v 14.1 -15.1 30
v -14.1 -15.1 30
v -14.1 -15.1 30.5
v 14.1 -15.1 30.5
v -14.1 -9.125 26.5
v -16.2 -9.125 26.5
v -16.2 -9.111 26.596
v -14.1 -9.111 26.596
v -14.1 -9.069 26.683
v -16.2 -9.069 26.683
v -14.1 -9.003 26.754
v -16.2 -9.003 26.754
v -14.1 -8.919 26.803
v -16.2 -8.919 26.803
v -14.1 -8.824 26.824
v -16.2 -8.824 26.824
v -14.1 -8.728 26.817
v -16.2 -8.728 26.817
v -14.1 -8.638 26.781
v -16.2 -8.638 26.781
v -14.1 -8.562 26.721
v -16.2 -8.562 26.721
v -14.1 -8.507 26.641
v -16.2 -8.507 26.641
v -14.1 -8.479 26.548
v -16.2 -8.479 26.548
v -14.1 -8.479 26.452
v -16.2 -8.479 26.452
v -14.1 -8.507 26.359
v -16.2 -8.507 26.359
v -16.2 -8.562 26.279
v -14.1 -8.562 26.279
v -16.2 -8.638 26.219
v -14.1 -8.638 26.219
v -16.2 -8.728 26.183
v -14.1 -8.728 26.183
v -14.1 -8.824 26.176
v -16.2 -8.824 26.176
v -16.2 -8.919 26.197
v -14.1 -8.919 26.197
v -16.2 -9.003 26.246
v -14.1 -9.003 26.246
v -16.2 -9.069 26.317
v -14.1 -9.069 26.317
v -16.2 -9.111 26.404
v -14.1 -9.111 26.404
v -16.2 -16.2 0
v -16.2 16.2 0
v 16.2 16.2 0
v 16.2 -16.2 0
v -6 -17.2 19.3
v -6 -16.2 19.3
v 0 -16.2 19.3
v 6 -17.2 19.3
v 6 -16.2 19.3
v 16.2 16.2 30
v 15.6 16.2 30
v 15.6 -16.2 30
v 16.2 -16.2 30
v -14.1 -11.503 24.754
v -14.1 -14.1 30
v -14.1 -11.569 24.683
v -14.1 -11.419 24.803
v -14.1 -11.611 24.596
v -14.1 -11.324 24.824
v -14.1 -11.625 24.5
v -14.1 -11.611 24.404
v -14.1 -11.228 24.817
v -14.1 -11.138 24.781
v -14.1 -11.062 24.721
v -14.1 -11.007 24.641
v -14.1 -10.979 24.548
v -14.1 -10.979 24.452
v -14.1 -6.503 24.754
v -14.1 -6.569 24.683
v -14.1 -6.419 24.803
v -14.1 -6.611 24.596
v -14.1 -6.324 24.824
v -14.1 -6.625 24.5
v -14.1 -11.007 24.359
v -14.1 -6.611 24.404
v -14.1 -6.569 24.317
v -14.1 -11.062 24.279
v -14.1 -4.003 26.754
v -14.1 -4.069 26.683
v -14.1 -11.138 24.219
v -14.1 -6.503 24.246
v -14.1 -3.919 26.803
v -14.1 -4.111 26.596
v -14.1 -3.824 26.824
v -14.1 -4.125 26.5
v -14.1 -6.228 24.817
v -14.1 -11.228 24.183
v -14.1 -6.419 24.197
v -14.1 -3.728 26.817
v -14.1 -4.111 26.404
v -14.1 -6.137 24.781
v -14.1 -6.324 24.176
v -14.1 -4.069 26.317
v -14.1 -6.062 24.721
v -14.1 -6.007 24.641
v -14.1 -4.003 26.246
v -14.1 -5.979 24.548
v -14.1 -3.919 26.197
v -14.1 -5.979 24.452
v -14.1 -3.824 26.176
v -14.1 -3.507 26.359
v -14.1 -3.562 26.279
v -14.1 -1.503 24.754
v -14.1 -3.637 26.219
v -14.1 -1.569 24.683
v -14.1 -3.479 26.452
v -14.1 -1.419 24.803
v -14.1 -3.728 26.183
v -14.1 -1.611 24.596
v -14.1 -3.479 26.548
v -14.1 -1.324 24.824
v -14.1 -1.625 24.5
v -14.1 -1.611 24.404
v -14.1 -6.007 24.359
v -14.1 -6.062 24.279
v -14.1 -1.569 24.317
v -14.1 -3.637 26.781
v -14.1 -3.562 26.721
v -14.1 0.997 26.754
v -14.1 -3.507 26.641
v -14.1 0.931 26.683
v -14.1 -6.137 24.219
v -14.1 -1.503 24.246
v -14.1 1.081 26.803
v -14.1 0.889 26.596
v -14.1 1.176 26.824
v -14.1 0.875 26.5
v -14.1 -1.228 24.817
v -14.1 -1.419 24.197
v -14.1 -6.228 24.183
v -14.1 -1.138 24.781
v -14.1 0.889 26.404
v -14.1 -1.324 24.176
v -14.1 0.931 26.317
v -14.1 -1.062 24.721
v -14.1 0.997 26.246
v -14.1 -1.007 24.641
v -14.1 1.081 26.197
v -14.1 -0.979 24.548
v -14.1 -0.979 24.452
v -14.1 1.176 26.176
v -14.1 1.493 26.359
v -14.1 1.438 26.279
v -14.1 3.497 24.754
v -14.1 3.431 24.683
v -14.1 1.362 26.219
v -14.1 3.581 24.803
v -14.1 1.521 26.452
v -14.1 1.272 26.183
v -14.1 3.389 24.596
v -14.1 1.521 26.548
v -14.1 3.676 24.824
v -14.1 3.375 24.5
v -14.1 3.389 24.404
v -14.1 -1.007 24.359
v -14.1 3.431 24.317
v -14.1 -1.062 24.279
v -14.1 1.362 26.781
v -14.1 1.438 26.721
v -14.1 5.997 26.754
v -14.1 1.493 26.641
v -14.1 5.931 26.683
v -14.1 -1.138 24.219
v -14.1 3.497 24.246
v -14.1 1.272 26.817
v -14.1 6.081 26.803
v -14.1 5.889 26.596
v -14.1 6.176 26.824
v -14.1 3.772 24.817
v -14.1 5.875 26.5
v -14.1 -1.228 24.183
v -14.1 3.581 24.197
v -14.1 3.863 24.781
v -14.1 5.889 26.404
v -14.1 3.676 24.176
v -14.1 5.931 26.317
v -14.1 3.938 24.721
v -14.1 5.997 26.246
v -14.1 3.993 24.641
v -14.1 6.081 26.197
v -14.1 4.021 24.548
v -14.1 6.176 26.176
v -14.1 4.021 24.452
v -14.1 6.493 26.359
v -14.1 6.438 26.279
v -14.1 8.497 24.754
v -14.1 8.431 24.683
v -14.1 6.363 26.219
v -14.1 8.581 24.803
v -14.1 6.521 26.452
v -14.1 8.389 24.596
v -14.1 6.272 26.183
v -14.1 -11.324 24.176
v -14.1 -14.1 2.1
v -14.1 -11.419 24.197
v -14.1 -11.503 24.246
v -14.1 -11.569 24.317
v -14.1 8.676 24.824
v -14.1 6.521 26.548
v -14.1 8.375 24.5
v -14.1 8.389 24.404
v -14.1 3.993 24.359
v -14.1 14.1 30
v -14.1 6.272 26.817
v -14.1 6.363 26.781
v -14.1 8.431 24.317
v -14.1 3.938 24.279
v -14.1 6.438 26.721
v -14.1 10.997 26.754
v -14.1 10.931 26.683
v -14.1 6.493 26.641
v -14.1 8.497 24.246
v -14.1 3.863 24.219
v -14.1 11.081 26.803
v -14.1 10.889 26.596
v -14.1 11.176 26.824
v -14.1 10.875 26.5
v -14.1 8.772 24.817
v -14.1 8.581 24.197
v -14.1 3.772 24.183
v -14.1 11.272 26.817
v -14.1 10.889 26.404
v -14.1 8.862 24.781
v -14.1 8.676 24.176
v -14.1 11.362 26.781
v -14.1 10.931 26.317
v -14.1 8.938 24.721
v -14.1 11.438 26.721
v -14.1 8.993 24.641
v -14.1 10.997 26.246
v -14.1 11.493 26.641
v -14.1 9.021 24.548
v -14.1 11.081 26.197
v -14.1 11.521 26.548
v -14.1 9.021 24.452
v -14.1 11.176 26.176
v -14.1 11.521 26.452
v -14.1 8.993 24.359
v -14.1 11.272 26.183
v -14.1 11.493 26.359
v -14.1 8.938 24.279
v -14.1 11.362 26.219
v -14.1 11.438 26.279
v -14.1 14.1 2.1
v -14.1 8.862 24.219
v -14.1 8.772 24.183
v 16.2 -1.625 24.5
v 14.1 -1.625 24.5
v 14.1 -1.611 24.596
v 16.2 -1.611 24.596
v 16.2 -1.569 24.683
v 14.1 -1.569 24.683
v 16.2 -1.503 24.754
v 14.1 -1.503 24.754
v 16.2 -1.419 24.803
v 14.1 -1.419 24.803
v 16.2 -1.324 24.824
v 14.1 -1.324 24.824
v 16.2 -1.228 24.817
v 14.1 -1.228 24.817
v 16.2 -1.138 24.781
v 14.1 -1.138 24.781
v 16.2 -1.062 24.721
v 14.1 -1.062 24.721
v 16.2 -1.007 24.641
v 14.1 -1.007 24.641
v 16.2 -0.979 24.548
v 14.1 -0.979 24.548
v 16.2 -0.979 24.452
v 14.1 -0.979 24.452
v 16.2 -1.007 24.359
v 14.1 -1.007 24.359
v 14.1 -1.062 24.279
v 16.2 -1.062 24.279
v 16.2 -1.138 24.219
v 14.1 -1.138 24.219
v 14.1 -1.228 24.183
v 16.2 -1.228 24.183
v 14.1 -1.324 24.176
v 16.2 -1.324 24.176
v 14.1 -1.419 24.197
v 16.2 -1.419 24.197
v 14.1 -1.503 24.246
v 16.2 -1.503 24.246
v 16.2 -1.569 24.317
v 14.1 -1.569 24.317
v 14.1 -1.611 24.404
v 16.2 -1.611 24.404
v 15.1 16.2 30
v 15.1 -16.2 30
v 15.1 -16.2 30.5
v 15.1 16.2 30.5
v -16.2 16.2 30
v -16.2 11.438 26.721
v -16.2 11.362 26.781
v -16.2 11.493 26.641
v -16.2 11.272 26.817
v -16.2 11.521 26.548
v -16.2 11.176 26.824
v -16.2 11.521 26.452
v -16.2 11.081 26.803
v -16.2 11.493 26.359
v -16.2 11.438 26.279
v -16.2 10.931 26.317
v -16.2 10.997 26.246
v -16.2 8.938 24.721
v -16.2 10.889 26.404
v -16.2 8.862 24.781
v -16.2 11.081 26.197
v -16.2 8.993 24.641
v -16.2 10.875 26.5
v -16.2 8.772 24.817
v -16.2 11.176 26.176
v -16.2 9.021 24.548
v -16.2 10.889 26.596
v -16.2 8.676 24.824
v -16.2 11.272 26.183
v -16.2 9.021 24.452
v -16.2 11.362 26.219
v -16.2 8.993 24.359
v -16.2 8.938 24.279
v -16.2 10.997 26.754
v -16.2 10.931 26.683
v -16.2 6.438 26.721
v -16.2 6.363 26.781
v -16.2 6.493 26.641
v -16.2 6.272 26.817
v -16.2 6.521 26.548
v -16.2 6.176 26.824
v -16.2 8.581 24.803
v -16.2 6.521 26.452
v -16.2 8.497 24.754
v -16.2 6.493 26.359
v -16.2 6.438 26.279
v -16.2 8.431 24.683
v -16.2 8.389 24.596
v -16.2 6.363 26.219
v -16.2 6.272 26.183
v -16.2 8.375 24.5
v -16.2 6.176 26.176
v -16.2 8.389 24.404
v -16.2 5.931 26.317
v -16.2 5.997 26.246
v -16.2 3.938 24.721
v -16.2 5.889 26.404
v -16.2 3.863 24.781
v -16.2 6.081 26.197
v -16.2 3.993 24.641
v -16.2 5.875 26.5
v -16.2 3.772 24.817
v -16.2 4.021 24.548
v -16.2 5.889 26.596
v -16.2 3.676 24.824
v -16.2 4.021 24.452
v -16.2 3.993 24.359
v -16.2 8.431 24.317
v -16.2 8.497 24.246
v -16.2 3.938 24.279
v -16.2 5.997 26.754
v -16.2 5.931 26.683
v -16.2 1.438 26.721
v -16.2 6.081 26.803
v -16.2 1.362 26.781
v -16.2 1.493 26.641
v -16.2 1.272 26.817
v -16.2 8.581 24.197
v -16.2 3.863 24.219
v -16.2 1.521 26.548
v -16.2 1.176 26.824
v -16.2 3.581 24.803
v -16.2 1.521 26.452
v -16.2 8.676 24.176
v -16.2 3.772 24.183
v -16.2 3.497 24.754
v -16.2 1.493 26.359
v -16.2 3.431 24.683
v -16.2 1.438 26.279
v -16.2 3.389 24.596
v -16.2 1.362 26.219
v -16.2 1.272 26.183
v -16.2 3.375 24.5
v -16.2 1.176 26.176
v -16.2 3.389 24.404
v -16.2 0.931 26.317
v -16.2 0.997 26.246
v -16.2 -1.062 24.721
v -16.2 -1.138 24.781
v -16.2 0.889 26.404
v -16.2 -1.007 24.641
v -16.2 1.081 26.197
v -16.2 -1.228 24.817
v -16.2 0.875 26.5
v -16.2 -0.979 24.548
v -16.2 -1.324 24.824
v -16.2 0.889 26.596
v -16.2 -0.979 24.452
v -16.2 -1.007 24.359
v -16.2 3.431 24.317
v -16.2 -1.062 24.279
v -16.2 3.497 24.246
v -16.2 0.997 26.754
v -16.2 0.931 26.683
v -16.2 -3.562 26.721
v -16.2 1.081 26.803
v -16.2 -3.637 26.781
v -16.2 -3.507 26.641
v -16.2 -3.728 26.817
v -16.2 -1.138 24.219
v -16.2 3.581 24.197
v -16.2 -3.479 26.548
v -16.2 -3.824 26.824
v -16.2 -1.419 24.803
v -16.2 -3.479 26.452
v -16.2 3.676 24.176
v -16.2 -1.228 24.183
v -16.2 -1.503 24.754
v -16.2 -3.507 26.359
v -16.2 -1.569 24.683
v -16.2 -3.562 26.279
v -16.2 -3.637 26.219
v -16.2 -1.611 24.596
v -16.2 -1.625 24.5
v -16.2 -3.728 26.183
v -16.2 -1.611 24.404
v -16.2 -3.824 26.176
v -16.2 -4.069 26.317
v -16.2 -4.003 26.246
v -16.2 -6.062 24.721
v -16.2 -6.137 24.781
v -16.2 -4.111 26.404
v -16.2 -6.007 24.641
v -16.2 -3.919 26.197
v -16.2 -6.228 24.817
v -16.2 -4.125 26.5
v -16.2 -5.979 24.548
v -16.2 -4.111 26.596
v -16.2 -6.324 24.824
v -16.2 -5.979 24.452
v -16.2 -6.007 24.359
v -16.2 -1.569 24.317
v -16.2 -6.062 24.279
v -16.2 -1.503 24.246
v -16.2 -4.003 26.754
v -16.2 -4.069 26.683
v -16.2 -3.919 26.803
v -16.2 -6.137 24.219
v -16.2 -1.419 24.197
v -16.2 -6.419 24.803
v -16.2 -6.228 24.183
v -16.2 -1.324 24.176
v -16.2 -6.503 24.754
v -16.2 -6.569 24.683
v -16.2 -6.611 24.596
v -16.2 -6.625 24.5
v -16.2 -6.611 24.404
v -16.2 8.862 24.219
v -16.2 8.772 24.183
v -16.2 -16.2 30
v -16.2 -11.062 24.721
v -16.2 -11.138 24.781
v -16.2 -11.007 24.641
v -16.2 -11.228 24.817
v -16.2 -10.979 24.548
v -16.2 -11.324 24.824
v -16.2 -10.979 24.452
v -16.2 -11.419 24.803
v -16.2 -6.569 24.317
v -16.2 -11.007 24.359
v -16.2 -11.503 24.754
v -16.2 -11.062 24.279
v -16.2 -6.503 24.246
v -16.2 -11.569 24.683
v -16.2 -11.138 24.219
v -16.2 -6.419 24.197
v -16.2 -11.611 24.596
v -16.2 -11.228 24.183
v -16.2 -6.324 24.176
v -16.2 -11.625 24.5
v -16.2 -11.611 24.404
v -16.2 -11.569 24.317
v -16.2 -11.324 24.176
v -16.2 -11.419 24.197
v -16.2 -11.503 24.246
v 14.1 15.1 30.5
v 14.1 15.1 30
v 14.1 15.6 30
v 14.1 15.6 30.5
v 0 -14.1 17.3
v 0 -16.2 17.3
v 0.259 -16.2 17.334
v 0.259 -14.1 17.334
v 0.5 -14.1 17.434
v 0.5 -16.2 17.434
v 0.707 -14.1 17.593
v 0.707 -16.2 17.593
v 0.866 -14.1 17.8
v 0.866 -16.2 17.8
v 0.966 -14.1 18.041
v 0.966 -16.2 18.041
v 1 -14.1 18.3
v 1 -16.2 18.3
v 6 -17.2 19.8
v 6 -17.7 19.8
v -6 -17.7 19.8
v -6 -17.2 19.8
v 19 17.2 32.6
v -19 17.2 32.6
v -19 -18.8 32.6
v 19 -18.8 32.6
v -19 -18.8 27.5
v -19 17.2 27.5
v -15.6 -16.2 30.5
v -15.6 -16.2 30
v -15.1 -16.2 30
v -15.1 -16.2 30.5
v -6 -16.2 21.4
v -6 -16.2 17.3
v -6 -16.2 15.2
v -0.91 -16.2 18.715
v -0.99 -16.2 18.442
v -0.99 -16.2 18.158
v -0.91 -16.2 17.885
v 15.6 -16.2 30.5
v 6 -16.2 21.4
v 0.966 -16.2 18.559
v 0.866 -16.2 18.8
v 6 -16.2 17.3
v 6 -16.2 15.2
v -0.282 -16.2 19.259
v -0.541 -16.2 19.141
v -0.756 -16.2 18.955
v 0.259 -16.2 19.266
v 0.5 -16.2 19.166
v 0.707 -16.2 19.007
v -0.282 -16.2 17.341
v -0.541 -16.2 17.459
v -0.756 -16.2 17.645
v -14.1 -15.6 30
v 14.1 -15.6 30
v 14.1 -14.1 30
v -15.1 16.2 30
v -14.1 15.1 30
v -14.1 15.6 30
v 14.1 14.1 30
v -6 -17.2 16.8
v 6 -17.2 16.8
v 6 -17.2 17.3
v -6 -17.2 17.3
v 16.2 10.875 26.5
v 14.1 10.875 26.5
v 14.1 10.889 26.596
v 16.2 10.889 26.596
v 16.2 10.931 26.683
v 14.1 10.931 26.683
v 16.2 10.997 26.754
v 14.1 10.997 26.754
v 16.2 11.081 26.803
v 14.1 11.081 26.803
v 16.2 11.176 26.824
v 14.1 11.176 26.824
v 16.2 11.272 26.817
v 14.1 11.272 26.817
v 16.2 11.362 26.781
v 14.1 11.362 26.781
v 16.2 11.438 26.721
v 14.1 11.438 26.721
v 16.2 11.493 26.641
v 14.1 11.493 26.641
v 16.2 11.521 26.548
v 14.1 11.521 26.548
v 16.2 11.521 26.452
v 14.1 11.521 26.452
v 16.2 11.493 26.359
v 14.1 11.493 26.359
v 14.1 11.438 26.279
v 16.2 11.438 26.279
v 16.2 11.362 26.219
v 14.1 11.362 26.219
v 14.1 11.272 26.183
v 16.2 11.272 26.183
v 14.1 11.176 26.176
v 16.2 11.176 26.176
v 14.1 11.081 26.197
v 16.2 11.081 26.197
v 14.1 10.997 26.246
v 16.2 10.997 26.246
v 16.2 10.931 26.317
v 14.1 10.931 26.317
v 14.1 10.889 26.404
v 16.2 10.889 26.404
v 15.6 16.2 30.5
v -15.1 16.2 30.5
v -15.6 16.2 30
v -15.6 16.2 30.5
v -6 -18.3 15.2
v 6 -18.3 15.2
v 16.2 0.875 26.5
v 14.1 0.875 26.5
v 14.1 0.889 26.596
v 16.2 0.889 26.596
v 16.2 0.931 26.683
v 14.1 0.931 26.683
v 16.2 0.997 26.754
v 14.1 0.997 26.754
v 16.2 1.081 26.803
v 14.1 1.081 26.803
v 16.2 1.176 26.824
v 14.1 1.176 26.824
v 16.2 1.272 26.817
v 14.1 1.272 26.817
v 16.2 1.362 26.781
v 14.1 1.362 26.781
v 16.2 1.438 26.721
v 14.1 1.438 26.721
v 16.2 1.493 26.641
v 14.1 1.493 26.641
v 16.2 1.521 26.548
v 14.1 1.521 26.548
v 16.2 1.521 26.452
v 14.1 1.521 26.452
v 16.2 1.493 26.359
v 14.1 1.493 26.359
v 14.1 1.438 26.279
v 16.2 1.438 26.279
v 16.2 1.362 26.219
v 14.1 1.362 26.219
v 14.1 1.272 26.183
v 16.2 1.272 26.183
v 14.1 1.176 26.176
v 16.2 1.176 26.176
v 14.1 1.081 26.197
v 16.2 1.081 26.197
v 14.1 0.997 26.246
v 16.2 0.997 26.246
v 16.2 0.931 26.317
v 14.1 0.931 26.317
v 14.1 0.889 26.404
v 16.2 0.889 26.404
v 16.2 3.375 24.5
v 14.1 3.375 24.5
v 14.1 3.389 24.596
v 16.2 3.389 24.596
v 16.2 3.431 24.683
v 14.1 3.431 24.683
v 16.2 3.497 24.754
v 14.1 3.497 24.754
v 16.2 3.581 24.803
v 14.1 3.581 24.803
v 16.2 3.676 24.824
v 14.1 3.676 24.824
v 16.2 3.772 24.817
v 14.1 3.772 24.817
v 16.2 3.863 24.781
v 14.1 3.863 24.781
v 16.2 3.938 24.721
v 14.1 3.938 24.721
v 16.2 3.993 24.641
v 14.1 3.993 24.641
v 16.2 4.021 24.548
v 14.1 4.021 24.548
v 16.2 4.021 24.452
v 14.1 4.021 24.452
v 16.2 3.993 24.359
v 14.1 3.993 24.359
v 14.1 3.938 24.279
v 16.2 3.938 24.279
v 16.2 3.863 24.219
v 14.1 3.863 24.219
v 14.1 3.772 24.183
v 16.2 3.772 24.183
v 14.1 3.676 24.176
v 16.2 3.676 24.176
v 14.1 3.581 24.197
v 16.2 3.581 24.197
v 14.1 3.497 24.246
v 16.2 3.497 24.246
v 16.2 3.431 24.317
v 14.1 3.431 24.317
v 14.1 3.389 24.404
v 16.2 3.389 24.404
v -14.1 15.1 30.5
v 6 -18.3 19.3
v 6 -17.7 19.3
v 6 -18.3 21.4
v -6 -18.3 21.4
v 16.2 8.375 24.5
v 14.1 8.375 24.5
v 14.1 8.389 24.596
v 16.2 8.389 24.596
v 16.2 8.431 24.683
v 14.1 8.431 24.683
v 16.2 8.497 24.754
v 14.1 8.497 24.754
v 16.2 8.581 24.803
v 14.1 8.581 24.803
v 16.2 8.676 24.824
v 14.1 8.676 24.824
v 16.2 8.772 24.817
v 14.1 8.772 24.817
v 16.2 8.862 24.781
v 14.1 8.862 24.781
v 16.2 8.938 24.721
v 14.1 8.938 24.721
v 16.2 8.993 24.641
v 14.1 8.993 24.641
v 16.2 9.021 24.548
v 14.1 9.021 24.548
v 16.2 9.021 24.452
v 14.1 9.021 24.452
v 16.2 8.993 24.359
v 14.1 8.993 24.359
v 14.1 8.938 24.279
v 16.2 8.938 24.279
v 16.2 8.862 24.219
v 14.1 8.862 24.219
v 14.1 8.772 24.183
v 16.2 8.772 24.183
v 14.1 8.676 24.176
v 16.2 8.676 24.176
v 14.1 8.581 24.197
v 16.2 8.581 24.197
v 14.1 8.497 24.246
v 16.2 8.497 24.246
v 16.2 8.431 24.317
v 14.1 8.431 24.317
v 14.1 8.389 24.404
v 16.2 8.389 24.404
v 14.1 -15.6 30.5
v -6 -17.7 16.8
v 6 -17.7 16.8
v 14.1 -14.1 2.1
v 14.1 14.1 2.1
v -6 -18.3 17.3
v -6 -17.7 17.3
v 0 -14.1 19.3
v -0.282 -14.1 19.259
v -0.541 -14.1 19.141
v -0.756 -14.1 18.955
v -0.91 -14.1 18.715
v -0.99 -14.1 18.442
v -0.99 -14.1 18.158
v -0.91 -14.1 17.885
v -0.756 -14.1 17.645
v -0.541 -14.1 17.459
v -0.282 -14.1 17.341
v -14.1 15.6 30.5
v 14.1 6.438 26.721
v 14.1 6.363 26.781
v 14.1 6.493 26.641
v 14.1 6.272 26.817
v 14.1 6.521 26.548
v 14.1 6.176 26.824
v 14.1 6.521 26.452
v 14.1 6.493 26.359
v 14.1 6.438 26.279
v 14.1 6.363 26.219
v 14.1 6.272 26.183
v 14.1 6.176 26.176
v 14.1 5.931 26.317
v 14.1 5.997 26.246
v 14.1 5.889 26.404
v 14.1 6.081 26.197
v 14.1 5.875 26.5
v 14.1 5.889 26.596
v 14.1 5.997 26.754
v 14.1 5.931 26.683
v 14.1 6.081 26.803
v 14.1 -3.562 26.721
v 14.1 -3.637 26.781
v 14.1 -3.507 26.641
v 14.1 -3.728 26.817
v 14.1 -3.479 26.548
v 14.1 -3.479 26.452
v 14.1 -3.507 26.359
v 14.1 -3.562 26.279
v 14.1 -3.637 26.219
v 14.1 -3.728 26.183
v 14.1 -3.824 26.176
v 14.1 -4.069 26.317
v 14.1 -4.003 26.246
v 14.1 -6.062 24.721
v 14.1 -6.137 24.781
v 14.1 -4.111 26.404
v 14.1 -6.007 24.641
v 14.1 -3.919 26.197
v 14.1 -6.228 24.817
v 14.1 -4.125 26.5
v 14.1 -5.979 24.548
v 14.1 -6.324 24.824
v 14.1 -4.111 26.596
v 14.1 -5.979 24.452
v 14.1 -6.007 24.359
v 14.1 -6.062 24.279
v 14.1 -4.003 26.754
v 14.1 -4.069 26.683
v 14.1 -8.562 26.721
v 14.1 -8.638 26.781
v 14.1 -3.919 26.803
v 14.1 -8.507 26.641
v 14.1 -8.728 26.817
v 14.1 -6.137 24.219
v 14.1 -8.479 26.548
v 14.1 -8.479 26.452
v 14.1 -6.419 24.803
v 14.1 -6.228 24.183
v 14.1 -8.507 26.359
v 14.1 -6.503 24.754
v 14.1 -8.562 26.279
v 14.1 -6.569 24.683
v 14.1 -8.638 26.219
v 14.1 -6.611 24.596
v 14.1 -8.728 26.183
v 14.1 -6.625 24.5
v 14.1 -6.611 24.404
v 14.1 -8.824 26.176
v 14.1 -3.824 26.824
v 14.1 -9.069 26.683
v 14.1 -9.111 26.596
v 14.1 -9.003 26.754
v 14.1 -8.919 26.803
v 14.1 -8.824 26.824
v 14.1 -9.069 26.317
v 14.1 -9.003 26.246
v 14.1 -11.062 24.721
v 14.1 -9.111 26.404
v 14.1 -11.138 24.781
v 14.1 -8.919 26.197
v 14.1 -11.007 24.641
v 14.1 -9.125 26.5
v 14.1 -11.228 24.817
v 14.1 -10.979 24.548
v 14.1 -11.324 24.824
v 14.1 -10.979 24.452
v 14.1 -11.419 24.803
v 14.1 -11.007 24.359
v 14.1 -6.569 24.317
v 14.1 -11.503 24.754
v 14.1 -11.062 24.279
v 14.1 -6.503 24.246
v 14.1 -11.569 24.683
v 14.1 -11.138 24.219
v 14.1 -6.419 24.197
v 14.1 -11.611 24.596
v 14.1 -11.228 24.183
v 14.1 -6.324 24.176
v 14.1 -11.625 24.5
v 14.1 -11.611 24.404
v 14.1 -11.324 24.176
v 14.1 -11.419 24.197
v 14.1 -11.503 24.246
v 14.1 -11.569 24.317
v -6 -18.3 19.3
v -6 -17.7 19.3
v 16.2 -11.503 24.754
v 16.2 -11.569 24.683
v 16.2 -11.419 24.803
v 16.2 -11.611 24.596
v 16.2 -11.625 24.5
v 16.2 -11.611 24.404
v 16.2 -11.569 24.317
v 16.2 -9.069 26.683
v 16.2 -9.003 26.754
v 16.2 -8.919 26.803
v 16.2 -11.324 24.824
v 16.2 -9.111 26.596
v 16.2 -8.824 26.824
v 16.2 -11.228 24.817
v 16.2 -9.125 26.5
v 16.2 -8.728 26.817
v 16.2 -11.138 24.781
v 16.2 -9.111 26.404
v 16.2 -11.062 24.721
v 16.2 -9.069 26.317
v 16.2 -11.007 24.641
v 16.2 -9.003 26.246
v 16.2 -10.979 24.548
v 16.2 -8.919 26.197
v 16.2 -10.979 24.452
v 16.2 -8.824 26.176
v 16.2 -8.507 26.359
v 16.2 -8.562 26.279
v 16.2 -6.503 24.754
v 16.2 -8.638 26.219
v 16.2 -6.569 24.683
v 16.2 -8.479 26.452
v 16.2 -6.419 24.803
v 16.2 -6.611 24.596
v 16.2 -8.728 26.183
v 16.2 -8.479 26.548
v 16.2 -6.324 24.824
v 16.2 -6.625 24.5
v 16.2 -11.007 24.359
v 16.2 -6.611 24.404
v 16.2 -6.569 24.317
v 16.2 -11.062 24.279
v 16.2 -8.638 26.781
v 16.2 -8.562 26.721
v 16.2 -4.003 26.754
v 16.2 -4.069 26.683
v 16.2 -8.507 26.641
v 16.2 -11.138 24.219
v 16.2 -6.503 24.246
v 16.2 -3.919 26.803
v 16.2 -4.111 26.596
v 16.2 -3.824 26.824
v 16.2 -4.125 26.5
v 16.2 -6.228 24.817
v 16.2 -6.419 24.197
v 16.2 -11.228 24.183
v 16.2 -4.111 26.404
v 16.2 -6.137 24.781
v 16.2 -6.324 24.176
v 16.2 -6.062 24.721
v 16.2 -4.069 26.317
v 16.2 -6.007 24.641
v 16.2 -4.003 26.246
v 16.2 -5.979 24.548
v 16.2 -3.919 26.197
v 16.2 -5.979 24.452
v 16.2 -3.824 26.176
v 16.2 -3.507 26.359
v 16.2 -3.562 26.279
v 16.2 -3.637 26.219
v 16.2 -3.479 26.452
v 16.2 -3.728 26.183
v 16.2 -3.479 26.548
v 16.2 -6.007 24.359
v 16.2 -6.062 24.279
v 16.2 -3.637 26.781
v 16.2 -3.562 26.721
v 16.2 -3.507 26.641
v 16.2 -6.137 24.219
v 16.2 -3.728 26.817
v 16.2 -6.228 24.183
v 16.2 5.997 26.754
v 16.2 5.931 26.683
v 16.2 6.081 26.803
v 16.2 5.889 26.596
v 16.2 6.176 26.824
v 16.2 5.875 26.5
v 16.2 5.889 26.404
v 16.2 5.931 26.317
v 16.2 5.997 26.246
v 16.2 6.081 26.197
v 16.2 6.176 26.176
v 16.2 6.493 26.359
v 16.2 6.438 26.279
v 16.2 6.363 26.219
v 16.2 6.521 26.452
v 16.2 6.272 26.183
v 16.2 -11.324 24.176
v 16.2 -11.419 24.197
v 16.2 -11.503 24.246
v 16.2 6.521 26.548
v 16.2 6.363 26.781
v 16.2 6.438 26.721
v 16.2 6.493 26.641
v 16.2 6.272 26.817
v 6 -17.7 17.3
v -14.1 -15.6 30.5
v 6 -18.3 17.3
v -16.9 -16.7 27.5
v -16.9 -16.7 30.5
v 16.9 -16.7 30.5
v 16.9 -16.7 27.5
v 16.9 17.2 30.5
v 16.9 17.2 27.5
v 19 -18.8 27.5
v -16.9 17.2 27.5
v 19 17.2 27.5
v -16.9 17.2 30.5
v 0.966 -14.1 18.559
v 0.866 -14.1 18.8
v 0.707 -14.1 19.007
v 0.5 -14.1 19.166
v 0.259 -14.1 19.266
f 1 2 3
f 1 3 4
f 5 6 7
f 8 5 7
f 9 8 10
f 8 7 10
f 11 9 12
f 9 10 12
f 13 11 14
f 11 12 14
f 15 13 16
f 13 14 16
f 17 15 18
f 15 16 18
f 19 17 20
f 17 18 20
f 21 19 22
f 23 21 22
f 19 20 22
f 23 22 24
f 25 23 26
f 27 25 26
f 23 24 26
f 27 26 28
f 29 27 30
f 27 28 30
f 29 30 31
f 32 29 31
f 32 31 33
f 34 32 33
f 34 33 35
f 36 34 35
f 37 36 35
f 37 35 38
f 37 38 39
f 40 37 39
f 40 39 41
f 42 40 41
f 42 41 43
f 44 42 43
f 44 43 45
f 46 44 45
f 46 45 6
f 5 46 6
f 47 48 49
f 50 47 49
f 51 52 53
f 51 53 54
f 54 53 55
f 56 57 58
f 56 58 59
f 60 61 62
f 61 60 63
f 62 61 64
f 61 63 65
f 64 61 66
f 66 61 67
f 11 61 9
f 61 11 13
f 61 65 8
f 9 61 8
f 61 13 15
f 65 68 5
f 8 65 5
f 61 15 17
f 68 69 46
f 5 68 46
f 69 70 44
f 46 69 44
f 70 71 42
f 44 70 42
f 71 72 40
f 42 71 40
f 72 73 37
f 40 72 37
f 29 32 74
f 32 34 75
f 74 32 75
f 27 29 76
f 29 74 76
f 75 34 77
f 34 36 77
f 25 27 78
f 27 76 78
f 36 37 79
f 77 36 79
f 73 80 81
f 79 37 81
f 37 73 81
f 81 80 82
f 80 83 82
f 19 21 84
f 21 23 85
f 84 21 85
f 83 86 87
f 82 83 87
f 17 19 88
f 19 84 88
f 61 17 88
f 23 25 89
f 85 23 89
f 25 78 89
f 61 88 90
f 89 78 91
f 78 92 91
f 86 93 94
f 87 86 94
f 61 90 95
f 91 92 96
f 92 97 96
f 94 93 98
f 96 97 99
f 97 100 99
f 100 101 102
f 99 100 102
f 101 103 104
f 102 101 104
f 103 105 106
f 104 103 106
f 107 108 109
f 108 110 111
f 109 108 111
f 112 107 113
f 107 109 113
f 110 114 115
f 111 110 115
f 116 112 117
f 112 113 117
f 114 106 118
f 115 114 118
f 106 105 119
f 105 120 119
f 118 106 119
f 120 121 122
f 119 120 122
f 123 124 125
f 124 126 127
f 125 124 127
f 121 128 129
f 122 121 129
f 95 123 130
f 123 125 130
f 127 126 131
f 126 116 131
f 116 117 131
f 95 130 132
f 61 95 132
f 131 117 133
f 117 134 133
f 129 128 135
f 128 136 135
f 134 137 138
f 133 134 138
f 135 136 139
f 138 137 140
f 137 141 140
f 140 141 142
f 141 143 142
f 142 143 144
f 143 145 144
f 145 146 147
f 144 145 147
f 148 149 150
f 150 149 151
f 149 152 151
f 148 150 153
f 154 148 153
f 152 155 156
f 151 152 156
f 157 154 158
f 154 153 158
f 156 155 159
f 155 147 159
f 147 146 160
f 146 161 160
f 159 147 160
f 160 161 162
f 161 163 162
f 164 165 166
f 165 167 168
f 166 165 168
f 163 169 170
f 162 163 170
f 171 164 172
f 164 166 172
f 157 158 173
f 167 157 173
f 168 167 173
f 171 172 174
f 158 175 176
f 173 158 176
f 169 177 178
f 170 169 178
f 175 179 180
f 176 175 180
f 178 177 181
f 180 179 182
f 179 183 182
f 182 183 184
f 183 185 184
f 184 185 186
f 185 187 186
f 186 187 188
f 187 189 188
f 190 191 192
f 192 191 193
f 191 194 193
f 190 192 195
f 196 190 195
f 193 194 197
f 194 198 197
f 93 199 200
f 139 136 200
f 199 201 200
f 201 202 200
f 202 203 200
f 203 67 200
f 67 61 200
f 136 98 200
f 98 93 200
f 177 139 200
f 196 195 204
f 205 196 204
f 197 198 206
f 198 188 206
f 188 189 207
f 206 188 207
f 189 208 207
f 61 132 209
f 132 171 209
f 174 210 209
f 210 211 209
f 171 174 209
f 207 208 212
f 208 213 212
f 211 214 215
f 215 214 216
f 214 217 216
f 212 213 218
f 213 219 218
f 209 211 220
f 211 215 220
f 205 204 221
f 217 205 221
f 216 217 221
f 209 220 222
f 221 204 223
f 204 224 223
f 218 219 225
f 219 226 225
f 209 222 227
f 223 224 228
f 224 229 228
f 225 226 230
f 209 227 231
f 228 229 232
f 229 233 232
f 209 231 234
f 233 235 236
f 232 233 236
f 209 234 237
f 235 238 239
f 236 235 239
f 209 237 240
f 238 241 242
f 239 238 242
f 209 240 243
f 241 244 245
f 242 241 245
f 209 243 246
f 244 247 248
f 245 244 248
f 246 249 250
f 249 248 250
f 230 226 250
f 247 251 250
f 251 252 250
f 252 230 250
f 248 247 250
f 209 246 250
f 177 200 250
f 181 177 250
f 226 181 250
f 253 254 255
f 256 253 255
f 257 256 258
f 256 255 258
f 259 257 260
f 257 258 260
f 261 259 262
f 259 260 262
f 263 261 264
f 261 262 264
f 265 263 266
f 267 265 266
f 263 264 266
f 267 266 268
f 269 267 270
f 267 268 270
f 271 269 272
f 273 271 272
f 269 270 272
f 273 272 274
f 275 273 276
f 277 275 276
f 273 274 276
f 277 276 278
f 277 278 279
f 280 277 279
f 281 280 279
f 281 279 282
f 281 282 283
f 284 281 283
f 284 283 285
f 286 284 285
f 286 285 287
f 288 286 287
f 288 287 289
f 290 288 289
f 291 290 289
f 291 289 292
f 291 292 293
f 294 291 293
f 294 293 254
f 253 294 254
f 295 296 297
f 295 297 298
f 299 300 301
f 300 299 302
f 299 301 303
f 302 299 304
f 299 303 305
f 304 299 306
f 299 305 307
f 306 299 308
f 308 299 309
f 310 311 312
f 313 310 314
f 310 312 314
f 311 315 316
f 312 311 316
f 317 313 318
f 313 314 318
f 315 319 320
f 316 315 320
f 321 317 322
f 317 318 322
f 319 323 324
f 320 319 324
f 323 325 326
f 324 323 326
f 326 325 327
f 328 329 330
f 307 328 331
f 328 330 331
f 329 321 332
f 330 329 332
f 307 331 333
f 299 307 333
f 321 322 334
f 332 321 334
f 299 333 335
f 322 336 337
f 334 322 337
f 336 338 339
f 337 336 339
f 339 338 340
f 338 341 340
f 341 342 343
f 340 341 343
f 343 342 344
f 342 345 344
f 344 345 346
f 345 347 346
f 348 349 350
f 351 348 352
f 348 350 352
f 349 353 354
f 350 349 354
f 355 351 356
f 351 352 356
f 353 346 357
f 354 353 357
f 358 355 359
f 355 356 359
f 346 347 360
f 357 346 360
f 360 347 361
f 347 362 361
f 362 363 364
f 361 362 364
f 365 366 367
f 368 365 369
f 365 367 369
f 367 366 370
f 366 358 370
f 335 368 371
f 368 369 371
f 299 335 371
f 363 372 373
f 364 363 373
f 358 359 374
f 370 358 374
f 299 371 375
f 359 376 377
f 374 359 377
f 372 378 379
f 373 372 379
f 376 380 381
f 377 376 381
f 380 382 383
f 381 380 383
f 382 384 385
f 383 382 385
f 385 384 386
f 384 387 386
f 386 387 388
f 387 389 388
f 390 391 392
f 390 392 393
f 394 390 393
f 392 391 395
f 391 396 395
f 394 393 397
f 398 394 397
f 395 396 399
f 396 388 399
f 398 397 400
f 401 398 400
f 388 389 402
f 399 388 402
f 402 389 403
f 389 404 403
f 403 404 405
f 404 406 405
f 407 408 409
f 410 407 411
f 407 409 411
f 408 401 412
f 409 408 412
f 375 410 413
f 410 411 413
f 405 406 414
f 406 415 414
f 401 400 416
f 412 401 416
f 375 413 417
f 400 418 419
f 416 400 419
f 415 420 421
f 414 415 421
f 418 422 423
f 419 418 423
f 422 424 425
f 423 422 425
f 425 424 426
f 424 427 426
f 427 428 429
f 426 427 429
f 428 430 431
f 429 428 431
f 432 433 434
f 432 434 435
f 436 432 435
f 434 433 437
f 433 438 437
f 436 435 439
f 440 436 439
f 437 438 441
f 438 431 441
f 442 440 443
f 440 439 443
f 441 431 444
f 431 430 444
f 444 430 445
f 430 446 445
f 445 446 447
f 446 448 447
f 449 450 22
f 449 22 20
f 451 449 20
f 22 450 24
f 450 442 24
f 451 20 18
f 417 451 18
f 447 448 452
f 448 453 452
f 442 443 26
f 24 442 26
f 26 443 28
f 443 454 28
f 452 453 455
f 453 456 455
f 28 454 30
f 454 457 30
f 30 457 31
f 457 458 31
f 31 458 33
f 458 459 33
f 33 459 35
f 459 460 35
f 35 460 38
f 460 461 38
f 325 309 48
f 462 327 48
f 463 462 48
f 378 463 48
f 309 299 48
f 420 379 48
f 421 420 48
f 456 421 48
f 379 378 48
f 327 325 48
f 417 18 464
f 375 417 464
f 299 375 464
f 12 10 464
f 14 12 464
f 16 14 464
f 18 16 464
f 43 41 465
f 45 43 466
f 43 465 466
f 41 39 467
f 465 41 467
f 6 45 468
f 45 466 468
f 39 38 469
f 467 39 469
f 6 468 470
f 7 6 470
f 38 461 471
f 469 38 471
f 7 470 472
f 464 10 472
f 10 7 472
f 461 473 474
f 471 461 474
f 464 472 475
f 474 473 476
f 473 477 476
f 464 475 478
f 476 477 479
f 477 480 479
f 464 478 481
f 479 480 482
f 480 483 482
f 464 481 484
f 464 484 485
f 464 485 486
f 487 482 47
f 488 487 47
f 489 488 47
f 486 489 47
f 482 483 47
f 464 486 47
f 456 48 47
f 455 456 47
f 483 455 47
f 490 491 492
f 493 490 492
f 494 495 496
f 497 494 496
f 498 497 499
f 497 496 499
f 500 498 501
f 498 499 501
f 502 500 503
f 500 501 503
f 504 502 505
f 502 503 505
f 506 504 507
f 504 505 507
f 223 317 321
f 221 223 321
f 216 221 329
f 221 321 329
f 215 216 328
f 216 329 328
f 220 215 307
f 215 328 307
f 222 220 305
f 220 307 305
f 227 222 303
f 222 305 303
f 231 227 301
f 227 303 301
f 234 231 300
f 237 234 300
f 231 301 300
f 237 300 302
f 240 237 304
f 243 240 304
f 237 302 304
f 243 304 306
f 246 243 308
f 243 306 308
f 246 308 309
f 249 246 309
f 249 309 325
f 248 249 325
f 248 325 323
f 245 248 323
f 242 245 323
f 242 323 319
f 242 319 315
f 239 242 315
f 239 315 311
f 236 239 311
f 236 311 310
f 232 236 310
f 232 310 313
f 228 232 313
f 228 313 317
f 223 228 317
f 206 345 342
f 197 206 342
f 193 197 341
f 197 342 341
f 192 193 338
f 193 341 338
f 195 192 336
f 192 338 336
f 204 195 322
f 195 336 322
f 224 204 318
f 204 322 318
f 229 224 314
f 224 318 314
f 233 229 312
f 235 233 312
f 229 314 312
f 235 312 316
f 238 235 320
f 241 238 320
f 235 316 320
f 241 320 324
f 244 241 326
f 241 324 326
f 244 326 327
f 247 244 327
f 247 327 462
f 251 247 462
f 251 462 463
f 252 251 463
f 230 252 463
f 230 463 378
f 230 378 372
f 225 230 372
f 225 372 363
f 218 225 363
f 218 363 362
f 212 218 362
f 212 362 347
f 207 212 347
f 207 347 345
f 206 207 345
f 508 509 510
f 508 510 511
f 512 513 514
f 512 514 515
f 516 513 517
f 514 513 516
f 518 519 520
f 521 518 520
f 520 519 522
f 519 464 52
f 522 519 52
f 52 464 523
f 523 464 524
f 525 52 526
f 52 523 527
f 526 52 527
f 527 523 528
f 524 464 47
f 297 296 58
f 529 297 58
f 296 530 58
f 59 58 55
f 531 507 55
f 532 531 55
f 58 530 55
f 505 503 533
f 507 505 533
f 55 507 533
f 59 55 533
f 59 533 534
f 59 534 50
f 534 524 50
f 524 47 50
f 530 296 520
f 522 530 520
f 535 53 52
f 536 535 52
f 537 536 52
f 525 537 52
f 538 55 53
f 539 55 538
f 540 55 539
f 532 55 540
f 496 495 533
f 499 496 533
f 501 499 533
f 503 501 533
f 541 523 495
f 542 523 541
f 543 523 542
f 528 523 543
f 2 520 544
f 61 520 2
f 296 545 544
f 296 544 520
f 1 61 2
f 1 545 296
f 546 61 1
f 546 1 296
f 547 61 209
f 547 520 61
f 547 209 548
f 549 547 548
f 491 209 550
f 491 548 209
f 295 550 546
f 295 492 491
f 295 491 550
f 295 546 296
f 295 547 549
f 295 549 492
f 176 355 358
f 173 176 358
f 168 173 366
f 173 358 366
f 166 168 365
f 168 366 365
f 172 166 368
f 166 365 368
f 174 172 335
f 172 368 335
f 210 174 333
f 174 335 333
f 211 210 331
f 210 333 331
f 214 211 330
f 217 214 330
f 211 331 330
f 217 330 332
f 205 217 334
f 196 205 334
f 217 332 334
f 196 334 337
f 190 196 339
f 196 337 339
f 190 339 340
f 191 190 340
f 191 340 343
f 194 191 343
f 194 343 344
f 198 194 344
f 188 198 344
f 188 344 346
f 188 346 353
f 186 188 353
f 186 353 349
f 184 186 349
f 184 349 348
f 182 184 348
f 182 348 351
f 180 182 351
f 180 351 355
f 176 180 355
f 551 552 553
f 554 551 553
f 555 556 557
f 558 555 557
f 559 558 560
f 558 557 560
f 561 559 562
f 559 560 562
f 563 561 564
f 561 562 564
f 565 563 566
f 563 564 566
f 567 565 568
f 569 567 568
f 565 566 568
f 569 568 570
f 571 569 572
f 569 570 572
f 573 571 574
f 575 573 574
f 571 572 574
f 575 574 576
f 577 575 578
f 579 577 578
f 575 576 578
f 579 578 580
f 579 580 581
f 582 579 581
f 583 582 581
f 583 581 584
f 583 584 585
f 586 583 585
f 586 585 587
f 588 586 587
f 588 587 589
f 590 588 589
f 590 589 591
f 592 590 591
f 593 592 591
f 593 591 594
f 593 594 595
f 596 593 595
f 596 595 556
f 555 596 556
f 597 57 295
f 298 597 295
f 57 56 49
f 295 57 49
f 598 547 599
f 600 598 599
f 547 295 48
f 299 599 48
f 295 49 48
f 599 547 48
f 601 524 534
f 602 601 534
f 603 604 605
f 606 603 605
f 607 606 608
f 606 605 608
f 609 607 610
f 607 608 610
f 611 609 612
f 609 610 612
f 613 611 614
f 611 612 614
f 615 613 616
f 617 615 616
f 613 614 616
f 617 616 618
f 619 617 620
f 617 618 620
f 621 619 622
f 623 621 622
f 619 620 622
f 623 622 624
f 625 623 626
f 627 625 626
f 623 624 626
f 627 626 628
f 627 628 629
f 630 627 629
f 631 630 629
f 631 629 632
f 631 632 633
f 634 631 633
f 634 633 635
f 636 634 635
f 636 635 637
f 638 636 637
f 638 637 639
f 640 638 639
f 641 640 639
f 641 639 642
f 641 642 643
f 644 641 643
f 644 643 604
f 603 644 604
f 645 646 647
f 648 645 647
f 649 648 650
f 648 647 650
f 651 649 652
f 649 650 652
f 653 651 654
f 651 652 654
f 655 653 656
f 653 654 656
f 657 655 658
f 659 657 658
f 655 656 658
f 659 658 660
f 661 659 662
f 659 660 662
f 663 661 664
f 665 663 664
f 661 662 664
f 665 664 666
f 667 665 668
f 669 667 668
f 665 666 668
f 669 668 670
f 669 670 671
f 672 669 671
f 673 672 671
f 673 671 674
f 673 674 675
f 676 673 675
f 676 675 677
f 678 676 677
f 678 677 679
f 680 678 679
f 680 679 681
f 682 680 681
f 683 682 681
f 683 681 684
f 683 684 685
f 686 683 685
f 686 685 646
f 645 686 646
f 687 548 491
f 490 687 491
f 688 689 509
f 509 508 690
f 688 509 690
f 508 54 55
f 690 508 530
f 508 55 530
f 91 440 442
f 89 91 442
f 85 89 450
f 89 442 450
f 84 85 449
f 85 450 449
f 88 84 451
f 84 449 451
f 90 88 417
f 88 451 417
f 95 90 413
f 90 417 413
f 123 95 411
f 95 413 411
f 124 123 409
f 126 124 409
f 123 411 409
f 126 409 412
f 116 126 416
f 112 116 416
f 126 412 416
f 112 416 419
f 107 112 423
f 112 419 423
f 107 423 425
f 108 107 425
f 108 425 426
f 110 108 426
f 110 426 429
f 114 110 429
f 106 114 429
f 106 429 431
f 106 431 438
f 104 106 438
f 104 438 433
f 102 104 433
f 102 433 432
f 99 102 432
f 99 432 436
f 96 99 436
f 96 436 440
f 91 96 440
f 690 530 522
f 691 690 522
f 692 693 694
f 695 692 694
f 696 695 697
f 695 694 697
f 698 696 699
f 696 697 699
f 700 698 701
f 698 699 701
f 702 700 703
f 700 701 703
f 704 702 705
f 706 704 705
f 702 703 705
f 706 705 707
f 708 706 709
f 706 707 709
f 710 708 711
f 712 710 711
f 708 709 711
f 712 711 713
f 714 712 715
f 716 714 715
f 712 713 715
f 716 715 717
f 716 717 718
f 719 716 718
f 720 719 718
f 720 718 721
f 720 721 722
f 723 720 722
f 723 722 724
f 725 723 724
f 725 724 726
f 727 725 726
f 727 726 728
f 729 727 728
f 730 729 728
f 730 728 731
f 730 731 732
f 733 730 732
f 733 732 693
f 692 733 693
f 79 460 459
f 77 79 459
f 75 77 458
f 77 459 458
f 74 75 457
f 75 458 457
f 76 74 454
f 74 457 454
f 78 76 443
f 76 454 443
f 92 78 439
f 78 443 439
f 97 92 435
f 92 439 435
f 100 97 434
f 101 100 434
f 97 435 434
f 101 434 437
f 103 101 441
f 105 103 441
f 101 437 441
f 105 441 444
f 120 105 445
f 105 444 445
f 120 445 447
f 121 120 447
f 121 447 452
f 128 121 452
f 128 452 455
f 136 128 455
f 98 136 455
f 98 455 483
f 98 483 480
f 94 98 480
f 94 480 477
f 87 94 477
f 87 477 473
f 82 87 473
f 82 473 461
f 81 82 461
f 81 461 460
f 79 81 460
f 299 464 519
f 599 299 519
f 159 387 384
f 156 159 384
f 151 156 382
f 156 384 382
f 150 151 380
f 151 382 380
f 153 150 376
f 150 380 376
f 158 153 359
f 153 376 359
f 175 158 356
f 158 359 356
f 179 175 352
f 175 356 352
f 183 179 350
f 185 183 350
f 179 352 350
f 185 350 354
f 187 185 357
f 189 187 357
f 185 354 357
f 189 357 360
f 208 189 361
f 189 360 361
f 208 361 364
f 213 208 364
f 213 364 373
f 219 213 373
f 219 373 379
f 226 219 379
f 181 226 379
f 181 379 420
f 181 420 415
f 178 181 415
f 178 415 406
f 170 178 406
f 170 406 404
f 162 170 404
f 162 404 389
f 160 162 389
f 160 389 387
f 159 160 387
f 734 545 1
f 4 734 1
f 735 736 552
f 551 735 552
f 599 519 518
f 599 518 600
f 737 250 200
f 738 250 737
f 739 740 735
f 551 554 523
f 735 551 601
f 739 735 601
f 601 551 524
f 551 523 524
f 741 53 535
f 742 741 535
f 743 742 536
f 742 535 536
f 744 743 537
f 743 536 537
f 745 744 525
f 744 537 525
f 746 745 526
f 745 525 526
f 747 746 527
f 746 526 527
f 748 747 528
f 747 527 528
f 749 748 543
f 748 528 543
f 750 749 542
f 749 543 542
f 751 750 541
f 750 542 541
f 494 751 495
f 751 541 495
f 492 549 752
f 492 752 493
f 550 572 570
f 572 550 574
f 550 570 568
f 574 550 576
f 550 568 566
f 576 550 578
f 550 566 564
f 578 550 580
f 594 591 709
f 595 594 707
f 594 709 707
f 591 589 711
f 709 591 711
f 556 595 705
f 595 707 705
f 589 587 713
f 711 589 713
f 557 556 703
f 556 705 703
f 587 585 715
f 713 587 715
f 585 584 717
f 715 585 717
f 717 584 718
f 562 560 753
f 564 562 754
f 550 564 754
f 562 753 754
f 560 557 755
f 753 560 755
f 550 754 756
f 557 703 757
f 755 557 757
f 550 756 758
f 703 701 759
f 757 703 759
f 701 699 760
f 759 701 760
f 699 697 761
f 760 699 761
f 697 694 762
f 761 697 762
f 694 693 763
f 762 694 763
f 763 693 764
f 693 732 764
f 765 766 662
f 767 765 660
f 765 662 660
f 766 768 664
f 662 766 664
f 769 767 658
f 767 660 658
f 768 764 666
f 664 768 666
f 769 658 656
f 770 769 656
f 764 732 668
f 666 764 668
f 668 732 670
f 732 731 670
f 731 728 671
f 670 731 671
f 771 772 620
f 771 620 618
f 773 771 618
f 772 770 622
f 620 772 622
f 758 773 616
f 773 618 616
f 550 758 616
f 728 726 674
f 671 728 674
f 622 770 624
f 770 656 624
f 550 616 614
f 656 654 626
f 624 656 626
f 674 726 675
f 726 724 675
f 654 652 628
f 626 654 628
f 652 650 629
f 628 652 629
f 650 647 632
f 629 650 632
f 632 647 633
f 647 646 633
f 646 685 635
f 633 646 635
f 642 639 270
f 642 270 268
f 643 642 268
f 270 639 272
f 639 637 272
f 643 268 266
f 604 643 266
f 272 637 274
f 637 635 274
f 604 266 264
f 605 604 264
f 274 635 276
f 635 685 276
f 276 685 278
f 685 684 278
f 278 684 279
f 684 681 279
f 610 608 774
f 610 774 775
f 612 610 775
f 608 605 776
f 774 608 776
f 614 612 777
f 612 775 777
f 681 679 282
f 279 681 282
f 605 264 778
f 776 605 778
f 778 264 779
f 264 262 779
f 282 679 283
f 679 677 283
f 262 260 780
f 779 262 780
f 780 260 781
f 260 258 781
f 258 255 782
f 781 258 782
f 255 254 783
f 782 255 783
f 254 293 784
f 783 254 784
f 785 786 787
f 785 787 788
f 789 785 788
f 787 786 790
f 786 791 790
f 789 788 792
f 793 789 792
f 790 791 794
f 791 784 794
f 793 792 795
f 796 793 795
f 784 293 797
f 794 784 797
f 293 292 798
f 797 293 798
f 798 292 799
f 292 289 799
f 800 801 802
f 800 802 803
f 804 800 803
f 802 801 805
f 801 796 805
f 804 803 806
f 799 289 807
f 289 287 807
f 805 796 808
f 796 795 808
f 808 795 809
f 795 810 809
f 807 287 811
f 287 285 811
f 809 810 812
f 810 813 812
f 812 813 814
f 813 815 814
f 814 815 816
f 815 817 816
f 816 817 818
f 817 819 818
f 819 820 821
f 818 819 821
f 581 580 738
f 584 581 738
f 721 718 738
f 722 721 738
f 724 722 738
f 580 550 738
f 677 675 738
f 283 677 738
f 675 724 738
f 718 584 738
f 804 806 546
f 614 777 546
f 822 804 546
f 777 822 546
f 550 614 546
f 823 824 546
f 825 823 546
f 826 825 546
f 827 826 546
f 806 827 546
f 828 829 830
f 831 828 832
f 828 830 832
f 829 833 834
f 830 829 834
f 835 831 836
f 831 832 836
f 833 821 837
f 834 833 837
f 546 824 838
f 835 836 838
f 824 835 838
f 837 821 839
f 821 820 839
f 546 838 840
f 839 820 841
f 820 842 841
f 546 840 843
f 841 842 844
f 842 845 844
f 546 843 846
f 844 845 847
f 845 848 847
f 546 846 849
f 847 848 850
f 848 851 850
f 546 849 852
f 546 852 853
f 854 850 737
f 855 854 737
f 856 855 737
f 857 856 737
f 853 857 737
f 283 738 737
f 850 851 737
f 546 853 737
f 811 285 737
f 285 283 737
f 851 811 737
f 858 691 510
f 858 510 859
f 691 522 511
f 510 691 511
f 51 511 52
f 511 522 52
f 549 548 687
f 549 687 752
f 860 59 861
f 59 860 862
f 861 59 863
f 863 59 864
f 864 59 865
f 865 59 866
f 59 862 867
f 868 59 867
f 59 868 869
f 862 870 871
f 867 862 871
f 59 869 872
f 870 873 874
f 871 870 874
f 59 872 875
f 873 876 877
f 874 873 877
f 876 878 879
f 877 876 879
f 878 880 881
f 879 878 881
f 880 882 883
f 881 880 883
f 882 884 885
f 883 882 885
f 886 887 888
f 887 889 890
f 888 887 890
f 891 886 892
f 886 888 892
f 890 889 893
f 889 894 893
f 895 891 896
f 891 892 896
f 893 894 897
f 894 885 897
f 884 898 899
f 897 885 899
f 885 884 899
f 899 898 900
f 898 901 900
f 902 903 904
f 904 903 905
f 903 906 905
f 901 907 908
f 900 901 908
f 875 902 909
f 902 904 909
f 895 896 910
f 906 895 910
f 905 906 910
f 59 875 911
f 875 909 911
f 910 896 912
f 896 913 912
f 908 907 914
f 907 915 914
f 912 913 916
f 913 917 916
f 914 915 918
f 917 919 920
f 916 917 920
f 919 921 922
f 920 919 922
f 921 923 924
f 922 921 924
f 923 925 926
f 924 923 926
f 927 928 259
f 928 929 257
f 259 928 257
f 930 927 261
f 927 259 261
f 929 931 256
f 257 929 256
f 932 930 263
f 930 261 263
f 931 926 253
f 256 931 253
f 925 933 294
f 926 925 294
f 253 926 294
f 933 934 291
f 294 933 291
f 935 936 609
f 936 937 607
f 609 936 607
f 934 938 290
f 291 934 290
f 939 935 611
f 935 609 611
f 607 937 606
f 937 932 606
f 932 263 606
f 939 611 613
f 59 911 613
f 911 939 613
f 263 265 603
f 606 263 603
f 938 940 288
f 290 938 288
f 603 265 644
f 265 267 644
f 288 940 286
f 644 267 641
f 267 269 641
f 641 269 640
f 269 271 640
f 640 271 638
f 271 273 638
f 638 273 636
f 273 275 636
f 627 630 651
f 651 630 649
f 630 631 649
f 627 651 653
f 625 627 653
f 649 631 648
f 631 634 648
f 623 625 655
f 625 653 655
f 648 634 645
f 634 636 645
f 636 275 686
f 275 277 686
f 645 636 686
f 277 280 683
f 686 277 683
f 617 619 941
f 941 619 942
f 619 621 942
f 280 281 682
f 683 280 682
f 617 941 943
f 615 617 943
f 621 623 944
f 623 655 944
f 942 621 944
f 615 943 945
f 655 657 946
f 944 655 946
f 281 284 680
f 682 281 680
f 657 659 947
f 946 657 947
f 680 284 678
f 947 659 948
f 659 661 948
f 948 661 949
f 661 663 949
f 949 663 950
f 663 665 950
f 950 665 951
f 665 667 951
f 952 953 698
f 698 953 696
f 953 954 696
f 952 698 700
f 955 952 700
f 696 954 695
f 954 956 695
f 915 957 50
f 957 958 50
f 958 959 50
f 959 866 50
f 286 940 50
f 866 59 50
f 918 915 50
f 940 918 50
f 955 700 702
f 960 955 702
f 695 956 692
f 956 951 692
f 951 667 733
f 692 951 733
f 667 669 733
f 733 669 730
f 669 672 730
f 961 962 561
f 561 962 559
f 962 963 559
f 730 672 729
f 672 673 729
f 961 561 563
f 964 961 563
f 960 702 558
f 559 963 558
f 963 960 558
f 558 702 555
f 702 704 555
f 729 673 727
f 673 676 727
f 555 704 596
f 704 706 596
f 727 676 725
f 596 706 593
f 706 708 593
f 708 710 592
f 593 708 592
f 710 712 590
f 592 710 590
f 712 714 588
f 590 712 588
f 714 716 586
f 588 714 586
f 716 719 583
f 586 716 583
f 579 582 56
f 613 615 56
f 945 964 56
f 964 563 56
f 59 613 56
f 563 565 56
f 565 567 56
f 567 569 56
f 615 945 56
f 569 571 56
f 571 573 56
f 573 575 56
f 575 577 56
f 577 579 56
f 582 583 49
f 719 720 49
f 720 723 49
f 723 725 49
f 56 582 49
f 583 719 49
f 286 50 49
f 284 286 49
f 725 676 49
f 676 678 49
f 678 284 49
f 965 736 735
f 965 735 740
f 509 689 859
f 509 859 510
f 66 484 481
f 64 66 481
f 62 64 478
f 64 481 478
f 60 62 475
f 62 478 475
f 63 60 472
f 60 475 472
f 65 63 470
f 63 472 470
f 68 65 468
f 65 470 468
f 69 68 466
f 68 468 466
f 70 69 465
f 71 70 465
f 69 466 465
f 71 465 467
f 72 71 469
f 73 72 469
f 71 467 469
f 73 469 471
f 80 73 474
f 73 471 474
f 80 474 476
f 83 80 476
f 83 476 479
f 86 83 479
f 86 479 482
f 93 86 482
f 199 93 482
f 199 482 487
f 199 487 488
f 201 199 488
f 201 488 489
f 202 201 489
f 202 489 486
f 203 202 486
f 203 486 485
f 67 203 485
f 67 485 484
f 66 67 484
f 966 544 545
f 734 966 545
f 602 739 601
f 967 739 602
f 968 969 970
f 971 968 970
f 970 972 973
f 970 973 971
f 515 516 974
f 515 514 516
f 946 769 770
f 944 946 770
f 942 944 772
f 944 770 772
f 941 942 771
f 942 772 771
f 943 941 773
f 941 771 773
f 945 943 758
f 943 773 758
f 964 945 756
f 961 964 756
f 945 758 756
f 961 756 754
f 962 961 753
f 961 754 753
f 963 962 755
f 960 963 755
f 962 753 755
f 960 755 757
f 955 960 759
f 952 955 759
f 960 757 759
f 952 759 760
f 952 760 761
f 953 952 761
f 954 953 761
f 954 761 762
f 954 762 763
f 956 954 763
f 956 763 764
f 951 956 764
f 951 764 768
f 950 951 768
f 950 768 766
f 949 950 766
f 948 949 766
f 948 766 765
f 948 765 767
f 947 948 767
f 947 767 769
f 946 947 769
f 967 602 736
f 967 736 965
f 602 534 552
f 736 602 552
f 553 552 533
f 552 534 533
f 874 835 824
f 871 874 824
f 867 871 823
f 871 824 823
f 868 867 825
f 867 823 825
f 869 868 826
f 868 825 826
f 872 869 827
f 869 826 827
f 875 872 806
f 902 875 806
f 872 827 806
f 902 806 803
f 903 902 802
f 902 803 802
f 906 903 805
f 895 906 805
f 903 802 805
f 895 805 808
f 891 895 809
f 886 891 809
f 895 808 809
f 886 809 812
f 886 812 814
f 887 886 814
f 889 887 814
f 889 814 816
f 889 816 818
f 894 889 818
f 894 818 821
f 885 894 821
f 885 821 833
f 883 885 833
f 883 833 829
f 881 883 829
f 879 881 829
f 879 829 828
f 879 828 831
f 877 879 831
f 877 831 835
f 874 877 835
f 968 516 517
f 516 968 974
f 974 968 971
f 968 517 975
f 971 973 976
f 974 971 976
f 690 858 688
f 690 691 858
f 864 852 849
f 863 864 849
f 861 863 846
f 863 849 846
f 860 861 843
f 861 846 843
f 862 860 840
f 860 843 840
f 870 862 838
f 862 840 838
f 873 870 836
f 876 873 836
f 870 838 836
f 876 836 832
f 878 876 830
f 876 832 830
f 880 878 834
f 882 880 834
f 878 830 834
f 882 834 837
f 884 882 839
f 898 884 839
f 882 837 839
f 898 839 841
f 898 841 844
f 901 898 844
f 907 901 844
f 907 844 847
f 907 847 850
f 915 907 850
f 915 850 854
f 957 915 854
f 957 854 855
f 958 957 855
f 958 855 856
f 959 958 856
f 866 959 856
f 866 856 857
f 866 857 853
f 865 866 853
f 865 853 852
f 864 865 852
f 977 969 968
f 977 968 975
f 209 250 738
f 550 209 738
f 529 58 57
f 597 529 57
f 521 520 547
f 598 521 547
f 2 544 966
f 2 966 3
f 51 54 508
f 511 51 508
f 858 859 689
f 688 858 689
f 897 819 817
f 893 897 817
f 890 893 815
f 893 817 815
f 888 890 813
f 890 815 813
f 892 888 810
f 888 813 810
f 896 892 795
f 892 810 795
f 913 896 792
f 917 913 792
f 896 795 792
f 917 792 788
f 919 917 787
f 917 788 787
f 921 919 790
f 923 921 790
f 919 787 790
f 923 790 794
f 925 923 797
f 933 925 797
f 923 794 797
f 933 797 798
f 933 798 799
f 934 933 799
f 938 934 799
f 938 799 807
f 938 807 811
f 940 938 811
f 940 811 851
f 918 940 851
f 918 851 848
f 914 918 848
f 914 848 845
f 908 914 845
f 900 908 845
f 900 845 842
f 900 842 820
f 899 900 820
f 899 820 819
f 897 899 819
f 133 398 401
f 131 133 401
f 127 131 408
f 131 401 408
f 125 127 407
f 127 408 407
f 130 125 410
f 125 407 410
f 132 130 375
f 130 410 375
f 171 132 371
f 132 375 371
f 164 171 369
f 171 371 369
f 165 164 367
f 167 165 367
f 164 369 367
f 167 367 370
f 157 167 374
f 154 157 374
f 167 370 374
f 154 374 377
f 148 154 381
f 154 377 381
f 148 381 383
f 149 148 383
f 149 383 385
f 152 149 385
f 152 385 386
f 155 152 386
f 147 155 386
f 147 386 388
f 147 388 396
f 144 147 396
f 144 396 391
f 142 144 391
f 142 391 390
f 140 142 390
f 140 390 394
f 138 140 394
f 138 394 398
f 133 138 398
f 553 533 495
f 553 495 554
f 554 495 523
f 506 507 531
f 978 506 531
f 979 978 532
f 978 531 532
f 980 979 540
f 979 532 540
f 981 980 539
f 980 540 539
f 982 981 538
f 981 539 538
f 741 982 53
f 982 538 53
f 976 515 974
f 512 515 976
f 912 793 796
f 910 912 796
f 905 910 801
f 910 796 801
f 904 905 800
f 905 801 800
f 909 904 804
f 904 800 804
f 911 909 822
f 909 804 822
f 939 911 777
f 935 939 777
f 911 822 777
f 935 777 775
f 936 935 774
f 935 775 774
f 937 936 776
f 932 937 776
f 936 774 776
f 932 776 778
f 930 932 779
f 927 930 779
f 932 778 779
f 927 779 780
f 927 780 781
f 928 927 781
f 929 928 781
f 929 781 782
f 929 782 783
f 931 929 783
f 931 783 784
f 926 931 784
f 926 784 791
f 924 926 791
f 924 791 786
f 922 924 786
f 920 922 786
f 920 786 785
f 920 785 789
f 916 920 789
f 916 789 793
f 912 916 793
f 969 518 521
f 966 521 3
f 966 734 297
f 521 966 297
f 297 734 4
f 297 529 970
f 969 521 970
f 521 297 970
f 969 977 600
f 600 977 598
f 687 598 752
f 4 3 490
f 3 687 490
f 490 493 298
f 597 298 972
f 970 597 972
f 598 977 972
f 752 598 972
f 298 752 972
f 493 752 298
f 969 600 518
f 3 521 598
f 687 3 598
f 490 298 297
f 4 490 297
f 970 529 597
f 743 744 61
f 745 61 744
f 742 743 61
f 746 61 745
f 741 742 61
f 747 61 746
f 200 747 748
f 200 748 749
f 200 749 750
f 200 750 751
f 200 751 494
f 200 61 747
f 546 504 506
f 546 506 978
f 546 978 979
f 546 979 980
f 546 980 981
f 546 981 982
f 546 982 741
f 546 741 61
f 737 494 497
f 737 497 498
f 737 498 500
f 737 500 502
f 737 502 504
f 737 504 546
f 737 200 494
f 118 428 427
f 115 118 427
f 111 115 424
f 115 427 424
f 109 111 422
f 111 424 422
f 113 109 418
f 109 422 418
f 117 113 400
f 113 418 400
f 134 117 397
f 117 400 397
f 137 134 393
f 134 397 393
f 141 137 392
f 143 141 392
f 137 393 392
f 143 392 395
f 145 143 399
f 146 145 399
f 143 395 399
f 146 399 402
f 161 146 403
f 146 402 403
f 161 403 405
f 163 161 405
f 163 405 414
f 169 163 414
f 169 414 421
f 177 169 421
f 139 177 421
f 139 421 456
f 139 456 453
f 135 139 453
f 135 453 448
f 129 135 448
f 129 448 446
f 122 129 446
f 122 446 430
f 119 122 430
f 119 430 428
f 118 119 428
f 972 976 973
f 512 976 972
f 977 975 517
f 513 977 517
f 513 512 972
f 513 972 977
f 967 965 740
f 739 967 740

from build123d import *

# Parameters (mm, degrees)
F0_W      = 28.2
F0_H      = 28.2
F2_DEPTH  = 2.1
F1_W      = 28.2
F1_H      = 2.1
F3_DEPTH  = 30
F4_W      = 0.5
F4_H      = 32.4
F4_W_2    = 28.2
F4_H_2    = 0.5
F5_DEPTH  = 0.5
F6_W      = 15.5
F6_H      = 36
F6_W_2    = 7
F7_DEPTH  = 2.1
F9_DEPTH  = 2.1
F10_DEPTH = 2.1
F11_W     = 33.8
F11_H     = 2.1
F12_DEPTH = 3
F13_R     = 0.325
F14_DEPTH = 35.201
F15_W     = 0.5
F15_H     = 0.5
F16_DEPTH = 25.001


with BuildPart() as f2:
    # F0 (on Top) → F2 (new body)
    with BuildSketch(Plane.XY):
        Rectangle(F0_W, F0_H)
    extrude(amount=F2_DEPTH)

    # F1 (on Top) → F3 (join)
    with BuildSketch(Plane.XY):
        Polygon((-16.2, 16.2), (-16.2, -16.2), (-14.1, -16.2), (-14.1, -14.1), (-14.1, 14.1), (-14.1, 16.2), align=None)
        with Locations((0, -15.15)):
            Rectangle(F1_W, F1_H)
        Polygon((14.1, -14.1), (14.1, -16.2), (16.2, -16.2), (16.2, 16.2), (14.1, 16.2), (14.1, 14.1), align=None)
        with Locations((0, 15.15)):
            Rectangle(F1_W, F1_H)
    extrude(amount=F3_DEPTH)

    # F4 (on face) → F5 (join)
    with BuildSketch(Plane.XY.offset(30)):
        with Locations((-15.35, 0)):
            Rectangle(F4_W, F4_H)
        with Locations((15.35, 0)):
            Rectangle(F4_W, F4_H)
        with Locations((0, 15.35)):
            Rectangle(F4_W_2, F4_H_2)
        with Locations((0, -15.35)):
            Rectangle(F4_W_2, F4_H_2)
    extrude(amount=F5_DEPTH)

    # F6 (on face) → F7 (join)
    with BuildSketch(Plane.XY.offset(30.5)):
        with Locations((-11.25, -0.8)):
            Rectangle(F6_W, F6_H)
        with Locations((4.25, -0.8)):
            Rectangle(F6_W, F6_H)
        with Locations((15.5, -0.8)):
            Rectangle(F6_W_2, F6_H)
    extrude(amount=F7_DEPTH)

    # F8 (on face) → F9 (cut, through all)
    with BuildSketch(Plane.XZ.offset(16.2)):
        with BuildLine():
            ThreePointArc((0, 17.3), (0.707107, 17.592893), (1, 18.3))
            ThreePointArc((1, 18.3), (0.707107, 19.007107), (0, 19.3))
            ThreePointArc((0, 19.3), (-1, 18.3), (0, 17.3))
        make_face()
    extrude(amount=-F9_DEPTH, mode=Mode.SUBTRACT)

    # F8 (on face) → F10 (join)
    with BuildSketch(Plane.XZ.offset(16.2)):
        Polygon((6, 17.3), (0, 17.3), (-6, 17.3), (-6, 15.2), (6, 15.2), align=None)
        Polygon((-6, 19.3), (0, 19.3), (6, 19.3), (6, 21.4), (-6, 21.4), align=None)
    extrude(amount=F10_DEPTH)

    # F11 (on face) → F12 (join)
    with BuildSketch(Plane.XY.offset(30.5)):
        Polygon((16.9, -16.7), (16.9, -18.8), (19, -18.8), (19, 17.2), (16.9, 17.2), align=None)
        with Locations((0, -17.75)):
            Rectangle(F11_W, F11_H)
        Polygon((-19, -18.8), (-16.9, -18.8), (-16.9, -16.7), (-16.9, 17.2), (-19, 17.2), align=None)
    extrude(amount=-F12_DEPTH)

    # F13 (on face) → F14 (cut, through all)
    with BuildSketch(Plane(origin=(-16.2, 0, 0), x_dir=(0, -1, 0), z_dir=(-1, 0, 0))):
        with Locations((-11.2, 26.5)):
            Circle(F13_R)
        with Locations((-8.7, 24.5)):
            Circle(F13_R)
        with Locations((-6.2, 26.5)):
            Circle(F13_R)
        with Locations((-3.7, 24.5)):
            Circle(F13_R)
        with Locations((-1.2, 26.5)):
            Circle(F13_R)
        with Locations((1.3, 24.5)):
            Circle(F13_R)
        with Locations((3.8, 26.5)):
            Circle(F13_R)
        with Locations((6.3, 24.5)):
            Circle(F13_R)
        with Locations((8.8, 26.5)):
            Circle(F13_R)
        with Locations((11.3, 24.5)):
            Circle(F13_R)
    extrude(amount=-F14_DEPTH, mode=Mode.SUBTRACT)

    # F15 (on face) → F16 (cut, through all)
    with BuildSketch(Plane.YZ.offset(6)):
        with Locations((-17.45, 17.05)):
            Rectangle(F15_W, F15_H)
        with Locations((-17.45, 19.55)):
            Rectangle(F15_W, F15_H)
    extrude(amount=-F16_DEPTH, mode=Mode.SUBTRACT)


solid = f2.part
